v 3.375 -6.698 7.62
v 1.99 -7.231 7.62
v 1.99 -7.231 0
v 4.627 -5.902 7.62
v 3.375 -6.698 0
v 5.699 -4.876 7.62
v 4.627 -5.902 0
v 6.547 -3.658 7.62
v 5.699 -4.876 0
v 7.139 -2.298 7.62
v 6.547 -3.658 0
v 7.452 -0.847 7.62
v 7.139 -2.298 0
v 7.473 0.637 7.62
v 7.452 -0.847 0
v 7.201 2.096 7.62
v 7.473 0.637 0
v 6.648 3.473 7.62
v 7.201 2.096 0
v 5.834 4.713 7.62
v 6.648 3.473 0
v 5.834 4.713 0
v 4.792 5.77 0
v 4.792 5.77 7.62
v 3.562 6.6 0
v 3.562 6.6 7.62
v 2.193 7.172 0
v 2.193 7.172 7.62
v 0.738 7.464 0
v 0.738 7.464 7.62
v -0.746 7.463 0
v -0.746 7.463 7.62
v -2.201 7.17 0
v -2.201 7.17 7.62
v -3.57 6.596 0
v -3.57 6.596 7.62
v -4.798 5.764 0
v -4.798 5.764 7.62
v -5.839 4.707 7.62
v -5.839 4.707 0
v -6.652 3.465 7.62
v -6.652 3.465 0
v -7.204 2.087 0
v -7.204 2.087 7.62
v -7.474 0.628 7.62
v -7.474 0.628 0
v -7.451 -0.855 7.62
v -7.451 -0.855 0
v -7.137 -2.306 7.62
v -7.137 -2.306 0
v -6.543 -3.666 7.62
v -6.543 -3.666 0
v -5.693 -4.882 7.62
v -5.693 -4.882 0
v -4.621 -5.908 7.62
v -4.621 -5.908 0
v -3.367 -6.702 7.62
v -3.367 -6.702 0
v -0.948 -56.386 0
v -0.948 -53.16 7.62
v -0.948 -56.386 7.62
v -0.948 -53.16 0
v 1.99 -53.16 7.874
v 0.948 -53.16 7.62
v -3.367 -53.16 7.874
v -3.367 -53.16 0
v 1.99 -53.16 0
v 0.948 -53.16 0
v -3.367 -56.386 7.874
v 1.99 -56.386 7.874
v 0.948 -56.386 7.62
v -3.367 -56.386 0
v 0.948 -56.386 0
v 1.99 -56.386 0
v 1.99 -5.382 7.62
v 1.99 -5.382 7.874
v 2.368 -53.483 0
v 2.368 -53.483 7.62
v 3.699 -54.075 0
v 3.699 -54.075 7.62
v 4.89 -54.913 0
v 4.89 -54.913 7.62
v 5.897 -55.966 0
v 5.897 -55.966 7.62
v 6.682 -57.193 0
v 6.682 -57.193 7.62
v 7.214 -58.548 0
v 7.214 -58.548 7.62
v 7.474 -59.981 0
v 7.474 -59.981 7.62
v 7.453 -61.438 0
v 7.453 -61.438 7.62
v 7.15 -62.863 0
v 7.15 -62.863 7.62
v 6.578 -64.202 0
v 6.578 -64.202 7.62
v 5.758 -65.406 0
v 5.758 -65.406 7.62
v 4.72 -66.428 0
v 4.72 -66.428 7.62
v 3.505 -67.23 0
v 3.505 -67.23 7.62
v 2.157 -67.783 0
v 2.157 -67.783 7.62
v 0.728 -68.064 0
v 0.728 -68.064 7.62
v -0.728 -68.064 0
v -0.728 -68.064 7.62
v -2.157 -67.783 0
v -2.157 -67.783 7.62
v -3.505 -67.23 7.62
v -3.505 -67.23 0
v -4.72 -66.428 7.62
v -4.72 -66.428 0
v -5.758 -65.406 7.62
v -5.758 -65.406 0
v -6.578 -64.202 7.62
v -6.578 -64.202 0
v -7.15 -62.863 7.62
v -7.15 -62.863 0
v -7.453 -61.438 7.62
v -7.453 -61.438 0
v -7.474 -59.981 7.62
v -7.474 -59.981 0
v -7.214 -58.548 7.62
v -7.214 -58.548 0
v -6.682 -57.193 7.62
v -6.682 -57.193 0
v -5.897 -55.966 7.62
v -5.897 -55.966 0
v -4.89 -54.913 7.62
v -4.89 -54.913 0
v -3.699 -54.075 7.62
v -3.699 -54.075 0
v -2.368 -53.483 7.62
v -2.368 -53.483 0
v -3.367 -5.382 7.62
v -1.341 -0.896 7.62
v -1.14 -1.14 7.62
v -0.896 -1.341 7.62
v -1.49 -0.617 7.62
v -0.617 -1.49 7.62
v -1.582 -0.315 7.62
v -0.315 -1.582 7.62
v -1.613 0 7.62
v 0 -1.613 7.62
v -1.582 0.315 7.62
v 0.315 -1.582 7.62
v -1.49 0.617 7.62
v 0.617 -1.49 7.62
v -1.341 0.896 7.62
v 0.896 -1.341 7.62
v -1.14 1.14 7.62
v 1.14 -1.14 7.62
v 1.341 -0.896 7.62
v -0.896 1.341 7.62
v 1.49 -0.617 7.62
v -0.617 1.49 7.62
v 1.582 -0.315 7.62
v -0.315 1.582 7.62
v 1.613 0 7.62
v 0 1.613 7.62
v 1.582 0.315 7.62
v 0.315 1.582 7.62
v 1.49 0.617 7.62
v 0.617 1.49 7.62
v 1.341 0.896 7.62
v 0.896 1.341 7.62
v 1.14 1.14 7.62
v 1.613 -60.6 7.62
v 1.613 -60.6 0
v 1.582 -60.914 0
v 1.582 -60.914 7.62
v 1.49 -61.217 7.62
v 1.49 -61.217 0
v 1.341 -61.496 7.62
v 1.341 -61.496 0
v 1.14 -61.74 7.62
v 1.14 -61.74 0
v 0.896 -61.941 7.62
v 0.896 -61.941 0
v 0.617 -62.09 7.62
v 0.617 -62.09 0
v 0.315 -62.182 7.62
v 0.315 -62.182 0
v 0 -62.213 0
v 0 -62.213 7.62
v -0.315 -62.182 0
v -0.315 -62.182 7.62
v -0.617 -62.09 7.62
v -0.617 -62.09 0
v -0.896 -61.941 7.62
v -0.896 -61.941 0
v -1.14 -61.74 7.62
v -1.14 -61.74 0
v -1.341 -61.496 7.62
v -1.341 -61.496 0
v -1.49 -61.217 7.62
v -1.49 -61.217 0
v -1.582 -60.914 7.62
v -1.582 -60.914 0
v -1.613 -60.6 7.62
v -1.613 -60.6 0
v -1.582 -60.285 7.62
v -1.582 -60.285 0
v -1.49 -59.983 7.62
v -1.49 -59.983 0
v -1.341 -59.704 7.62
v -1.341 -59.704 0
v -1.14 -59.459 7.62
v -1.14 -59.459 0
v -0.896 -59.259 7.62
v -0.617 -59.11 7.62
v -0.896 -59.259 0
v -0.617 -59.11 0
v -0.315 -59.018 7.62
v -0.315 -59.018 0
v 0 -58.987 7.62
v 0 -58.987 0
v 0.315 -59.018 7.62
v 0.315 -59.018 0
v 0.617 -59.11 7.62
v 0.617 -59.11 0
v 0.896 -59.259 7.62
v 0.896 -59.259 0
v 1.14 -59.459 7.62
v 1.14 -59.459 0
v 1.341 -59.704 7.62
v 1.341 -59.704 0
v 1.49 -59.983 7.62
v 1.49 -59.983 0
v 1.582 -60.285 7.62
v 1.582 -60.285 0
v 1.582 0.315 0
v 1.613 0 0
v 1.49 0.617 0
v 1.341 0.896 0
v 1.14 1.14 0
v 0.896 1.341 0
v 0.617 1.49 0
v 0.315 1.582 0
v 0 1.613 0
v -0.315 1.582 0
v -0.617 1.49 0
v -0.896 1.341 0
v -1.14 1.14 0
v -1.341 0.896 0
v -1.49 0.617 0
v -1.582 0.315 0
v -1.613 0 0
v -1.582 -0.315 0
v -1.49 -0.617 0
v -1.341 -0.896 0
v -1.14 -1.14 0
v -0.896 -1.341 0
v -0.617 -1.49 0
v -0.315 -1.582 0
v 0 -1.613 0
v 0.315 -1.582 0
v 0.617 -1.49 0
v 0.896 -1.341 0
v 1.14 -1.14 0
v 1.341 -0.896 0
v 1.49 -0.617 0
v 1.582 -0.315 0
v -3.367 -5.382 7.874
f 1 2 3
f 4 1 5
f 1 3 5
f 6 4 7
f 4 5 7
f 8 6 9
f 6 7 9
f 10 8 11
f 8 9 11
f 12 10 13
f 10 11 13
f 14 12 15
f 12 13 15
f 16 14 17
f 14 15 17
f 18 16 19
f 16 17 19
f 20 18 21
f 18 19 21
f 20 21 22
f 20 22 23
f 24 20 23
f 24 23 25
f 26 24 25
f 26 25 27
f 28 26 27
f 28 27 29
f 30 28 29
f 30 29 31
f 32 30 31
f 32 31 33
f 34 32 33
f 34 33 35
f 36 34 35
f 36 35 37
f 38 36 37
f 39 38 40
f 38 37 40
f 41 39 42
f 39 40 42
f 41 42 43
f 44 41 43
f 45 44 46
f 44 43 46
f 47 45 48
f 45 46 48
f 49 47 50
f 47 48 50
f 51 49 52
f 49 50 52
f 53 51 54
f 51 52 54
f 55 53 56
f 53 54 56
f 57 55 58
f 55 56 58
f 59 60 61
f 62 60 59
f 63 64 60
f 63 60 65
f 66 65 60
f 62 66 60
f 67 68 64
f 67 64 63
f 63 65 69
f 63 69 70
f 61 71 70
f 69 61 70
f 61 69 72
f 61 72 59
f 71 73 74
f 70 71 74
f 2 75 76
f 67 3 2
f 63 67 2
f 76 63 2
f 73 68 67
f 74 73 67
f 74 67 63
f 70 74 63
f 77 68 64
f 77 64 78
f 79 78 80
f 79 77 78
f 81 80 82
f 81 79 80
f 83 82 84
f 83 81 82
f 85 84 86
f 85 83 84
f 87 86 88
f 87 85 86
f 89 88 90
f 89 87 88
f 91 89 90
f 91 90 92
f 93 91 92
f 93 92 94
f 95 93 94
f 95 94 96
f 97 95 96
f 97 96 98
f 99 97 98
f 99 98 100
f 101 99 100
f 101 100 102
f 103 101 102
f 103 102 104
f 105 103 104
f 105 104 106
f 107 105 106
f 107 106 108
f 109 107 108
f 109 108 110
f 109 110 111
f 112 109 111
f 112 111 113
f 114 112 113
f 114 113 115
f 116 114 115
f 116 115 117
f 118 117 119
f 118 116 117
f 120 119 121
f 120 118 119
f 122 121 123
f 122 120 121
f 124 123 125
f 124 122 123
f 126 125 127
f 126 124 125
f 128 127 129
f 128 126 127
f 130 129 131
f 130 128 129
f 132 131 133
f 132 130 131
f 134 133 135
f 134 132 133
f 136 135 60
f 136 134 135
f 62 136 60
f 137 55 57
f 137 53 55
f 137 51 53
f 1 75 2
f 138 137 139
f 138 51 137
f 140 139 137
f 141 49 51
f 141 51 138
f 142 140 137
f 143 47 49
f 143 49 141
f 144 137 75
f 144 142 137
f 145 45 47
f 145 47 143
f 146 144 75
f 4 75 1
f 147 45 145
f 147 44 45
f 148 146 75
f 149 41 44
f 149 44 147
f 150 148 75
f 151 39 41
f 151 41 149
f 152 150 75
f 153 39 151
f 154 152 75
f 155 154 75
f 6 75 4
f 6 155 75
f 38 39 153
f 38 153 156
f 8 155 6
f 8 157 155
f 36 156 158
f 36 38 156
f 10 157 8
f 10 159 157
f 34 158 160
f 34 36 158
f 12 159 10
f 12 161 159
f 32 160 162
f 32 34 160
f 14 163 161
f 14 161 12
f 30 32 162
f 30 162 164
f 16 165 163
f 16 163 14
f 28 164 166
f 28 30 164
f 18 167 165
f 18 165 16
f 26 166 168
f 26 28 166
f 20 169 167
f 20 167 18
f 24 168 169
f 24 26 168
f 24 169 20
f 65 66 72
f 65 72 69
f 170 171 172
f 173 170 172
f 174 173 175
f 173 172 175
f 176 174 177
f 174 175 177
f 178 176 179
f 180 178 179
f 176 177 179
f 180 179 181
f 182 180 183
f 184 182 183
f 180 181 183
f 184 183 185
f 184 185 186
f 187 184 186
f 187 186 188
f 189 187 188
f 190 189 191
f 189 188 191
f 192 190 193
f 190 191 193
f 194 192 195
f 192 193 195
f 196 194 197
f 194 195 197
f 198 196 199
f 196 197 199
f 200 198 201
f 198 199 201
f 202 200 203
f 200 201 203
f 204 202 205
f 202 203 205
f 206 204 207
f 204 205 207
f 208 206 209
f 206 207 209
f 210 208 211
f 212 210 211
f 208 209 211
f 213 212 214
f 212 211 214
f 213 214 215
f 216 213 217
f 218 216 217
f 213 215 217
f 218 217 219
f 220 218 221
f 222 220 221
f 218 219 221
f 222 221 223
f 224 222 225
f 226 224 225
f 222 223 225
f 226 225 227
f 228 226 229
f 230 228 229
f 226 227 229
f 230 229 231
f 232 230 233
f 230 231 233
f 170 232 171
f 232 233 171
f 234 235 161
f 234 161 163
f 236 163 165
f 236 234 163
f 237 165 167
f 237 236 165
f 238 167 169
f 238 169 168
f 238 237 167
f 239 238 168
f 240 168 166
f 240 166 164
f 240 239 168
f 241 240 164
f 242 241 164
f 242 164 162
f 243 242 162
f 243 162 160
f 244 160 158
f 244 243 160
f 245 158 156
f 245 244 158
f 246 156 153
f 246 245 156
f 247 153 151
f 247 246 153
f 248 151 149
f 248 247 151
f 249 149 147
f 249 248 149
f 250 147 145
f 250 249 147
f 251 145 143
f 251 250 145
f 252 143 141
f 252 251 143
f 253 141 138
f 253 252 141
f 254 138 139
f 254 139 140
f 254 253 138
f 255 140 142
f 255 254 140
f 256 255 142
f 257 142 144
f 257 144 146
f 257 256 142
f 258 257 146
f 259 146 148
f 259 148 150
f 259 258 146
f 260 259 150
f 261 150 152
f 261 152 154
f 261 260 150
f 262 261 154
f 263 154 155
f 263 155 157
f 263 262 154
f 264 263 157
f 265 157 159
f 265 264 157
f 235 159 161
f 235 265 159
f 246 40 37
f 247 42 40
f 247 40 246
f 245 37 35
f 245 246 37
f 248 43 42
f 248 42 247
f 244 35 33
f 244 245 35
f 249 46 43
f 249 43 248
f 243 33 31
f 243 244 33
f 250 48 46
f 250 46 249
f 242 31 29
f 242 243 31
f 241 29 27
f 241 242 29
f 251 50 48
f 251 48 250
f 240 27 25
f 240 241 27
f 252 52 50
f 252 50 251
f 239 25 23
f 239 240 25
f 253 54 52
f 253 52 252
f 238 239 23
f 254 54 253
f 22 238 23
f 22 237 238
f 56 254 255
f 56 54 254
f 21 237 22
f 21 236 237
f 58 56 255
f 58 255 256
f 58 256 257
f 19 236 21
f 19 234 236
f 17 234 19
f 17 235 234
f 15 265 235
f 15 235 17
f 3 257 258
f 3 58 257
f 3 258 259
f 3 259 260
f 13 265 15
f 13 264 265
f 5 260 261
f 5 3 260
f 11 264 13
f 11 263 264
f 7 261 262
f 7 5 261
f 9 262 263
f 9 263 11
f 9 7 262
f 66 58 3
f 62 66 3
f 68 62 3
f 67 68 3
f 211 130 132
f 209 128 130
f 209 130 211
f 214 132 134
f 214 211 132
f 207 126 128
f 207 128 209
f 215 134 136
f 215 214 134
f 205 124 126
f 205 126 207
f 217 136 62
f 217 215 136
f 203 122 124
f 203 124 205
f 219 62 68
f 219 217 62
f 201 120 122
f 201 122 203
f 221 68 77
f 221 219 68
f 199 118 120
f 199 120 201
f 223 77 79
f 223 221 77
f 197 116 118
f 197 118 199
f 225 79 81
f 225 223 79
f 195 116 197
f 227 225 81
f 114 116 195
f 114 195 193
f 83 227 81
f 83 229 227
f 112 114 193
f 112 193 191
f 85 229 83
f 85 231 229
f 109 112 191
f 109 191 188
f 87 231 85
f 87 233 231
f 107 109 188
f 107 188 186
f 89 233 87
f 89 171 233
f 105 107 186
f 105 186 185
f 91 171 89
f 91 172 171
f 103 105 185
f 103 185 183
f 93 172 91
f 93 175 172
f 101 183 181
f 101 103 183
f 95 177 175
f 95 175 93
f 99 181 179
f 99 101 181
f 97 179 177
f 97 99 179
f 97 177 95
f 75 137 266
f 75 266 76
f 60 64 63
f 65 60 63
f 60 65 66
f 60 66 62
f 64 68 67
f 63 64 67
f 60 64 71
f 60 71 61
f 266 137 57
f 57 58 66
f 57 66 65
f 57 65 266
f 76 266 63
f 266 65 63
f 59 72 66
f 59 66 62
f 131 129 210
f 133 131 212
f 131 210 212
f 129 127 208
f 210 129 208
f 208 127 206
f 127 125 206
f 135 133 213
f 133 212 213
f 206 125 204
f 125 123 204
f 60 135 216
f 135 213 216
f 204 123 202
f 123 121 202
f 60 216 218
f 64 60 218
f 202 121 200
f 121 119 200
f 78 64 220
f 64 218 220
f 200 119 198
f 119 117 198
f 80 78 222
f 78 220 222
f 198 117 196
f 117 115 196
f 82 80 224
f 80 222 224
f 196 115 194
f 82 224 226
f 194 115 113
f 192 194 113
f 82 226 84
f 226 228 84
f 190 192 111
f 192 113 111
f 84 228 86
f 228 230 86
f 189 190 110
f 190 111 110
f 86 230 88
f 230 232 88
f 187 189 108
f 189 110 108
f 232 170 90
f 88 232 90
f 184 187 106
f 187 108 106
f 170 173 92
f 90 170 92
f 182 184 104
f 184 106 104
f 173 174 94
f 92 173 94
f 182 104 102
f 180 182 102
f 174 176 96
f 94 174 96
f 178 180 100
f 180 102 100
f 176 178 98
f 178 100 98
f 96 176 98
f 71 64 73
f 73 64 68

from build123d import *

# Parameters (mm, degrees)
F0_R     = 7.5
F0_R_2   = 1.6129
F1_DEPTH = 7.62
F2_W     = 5.3571020449
F2_H     = 45.72
F3_DEPTH = 7.874
F7_DEPTH = 3.2258
F8_DEPTH = 2.0574


with BuildPart() as f1:
    # F0 (on Top) → F1 (new body)
    with BuildSketch(Plane.XY):
        Circle(F0_R)
        Circle(F0_R_2, mode=Mode.SUBTRACT)
    extrude(amount=F1_DEPTH)


with BuildPart() as f3:
    # F2 (on Top) → F3 (new body)
    with BuildSketch(Plane.XY):
        with Locations((-0.6885244511, -30.2998730913)):
            Rectangle(F2_W, F2_H)
    extrude(amount=F3_DEPTH)

    # F6: F1 across plane
    add(f1.part.mirror(Plane.XZ.offset(30.2998730913)))


with BuildPart() as f7:
    # F7 (new): a face of the model
    f7_faces = [f3.part.faces().sort_by_distance(p)[0] for p in [
        (-1.0470686327, -53.1598730913, 4.0031343413),
    ]]
    extrude(f7_faces, amount=F7_DEPTH)


with BuildPart() as f1_1:
    add(f1.part)

    # F8 (add): a face of the model
    f8_faces = [f3.part.faces().sort_by_distance(p)[0] for p in [
        (-0.6885244511, -7.4398730913, 3.937),
    ]]

    add(f3.part)  # F8 merges F3
    extrude(f8_faces, amount=F8_DEPTH)


solid = Compound([f7.part, f1_1.part])
